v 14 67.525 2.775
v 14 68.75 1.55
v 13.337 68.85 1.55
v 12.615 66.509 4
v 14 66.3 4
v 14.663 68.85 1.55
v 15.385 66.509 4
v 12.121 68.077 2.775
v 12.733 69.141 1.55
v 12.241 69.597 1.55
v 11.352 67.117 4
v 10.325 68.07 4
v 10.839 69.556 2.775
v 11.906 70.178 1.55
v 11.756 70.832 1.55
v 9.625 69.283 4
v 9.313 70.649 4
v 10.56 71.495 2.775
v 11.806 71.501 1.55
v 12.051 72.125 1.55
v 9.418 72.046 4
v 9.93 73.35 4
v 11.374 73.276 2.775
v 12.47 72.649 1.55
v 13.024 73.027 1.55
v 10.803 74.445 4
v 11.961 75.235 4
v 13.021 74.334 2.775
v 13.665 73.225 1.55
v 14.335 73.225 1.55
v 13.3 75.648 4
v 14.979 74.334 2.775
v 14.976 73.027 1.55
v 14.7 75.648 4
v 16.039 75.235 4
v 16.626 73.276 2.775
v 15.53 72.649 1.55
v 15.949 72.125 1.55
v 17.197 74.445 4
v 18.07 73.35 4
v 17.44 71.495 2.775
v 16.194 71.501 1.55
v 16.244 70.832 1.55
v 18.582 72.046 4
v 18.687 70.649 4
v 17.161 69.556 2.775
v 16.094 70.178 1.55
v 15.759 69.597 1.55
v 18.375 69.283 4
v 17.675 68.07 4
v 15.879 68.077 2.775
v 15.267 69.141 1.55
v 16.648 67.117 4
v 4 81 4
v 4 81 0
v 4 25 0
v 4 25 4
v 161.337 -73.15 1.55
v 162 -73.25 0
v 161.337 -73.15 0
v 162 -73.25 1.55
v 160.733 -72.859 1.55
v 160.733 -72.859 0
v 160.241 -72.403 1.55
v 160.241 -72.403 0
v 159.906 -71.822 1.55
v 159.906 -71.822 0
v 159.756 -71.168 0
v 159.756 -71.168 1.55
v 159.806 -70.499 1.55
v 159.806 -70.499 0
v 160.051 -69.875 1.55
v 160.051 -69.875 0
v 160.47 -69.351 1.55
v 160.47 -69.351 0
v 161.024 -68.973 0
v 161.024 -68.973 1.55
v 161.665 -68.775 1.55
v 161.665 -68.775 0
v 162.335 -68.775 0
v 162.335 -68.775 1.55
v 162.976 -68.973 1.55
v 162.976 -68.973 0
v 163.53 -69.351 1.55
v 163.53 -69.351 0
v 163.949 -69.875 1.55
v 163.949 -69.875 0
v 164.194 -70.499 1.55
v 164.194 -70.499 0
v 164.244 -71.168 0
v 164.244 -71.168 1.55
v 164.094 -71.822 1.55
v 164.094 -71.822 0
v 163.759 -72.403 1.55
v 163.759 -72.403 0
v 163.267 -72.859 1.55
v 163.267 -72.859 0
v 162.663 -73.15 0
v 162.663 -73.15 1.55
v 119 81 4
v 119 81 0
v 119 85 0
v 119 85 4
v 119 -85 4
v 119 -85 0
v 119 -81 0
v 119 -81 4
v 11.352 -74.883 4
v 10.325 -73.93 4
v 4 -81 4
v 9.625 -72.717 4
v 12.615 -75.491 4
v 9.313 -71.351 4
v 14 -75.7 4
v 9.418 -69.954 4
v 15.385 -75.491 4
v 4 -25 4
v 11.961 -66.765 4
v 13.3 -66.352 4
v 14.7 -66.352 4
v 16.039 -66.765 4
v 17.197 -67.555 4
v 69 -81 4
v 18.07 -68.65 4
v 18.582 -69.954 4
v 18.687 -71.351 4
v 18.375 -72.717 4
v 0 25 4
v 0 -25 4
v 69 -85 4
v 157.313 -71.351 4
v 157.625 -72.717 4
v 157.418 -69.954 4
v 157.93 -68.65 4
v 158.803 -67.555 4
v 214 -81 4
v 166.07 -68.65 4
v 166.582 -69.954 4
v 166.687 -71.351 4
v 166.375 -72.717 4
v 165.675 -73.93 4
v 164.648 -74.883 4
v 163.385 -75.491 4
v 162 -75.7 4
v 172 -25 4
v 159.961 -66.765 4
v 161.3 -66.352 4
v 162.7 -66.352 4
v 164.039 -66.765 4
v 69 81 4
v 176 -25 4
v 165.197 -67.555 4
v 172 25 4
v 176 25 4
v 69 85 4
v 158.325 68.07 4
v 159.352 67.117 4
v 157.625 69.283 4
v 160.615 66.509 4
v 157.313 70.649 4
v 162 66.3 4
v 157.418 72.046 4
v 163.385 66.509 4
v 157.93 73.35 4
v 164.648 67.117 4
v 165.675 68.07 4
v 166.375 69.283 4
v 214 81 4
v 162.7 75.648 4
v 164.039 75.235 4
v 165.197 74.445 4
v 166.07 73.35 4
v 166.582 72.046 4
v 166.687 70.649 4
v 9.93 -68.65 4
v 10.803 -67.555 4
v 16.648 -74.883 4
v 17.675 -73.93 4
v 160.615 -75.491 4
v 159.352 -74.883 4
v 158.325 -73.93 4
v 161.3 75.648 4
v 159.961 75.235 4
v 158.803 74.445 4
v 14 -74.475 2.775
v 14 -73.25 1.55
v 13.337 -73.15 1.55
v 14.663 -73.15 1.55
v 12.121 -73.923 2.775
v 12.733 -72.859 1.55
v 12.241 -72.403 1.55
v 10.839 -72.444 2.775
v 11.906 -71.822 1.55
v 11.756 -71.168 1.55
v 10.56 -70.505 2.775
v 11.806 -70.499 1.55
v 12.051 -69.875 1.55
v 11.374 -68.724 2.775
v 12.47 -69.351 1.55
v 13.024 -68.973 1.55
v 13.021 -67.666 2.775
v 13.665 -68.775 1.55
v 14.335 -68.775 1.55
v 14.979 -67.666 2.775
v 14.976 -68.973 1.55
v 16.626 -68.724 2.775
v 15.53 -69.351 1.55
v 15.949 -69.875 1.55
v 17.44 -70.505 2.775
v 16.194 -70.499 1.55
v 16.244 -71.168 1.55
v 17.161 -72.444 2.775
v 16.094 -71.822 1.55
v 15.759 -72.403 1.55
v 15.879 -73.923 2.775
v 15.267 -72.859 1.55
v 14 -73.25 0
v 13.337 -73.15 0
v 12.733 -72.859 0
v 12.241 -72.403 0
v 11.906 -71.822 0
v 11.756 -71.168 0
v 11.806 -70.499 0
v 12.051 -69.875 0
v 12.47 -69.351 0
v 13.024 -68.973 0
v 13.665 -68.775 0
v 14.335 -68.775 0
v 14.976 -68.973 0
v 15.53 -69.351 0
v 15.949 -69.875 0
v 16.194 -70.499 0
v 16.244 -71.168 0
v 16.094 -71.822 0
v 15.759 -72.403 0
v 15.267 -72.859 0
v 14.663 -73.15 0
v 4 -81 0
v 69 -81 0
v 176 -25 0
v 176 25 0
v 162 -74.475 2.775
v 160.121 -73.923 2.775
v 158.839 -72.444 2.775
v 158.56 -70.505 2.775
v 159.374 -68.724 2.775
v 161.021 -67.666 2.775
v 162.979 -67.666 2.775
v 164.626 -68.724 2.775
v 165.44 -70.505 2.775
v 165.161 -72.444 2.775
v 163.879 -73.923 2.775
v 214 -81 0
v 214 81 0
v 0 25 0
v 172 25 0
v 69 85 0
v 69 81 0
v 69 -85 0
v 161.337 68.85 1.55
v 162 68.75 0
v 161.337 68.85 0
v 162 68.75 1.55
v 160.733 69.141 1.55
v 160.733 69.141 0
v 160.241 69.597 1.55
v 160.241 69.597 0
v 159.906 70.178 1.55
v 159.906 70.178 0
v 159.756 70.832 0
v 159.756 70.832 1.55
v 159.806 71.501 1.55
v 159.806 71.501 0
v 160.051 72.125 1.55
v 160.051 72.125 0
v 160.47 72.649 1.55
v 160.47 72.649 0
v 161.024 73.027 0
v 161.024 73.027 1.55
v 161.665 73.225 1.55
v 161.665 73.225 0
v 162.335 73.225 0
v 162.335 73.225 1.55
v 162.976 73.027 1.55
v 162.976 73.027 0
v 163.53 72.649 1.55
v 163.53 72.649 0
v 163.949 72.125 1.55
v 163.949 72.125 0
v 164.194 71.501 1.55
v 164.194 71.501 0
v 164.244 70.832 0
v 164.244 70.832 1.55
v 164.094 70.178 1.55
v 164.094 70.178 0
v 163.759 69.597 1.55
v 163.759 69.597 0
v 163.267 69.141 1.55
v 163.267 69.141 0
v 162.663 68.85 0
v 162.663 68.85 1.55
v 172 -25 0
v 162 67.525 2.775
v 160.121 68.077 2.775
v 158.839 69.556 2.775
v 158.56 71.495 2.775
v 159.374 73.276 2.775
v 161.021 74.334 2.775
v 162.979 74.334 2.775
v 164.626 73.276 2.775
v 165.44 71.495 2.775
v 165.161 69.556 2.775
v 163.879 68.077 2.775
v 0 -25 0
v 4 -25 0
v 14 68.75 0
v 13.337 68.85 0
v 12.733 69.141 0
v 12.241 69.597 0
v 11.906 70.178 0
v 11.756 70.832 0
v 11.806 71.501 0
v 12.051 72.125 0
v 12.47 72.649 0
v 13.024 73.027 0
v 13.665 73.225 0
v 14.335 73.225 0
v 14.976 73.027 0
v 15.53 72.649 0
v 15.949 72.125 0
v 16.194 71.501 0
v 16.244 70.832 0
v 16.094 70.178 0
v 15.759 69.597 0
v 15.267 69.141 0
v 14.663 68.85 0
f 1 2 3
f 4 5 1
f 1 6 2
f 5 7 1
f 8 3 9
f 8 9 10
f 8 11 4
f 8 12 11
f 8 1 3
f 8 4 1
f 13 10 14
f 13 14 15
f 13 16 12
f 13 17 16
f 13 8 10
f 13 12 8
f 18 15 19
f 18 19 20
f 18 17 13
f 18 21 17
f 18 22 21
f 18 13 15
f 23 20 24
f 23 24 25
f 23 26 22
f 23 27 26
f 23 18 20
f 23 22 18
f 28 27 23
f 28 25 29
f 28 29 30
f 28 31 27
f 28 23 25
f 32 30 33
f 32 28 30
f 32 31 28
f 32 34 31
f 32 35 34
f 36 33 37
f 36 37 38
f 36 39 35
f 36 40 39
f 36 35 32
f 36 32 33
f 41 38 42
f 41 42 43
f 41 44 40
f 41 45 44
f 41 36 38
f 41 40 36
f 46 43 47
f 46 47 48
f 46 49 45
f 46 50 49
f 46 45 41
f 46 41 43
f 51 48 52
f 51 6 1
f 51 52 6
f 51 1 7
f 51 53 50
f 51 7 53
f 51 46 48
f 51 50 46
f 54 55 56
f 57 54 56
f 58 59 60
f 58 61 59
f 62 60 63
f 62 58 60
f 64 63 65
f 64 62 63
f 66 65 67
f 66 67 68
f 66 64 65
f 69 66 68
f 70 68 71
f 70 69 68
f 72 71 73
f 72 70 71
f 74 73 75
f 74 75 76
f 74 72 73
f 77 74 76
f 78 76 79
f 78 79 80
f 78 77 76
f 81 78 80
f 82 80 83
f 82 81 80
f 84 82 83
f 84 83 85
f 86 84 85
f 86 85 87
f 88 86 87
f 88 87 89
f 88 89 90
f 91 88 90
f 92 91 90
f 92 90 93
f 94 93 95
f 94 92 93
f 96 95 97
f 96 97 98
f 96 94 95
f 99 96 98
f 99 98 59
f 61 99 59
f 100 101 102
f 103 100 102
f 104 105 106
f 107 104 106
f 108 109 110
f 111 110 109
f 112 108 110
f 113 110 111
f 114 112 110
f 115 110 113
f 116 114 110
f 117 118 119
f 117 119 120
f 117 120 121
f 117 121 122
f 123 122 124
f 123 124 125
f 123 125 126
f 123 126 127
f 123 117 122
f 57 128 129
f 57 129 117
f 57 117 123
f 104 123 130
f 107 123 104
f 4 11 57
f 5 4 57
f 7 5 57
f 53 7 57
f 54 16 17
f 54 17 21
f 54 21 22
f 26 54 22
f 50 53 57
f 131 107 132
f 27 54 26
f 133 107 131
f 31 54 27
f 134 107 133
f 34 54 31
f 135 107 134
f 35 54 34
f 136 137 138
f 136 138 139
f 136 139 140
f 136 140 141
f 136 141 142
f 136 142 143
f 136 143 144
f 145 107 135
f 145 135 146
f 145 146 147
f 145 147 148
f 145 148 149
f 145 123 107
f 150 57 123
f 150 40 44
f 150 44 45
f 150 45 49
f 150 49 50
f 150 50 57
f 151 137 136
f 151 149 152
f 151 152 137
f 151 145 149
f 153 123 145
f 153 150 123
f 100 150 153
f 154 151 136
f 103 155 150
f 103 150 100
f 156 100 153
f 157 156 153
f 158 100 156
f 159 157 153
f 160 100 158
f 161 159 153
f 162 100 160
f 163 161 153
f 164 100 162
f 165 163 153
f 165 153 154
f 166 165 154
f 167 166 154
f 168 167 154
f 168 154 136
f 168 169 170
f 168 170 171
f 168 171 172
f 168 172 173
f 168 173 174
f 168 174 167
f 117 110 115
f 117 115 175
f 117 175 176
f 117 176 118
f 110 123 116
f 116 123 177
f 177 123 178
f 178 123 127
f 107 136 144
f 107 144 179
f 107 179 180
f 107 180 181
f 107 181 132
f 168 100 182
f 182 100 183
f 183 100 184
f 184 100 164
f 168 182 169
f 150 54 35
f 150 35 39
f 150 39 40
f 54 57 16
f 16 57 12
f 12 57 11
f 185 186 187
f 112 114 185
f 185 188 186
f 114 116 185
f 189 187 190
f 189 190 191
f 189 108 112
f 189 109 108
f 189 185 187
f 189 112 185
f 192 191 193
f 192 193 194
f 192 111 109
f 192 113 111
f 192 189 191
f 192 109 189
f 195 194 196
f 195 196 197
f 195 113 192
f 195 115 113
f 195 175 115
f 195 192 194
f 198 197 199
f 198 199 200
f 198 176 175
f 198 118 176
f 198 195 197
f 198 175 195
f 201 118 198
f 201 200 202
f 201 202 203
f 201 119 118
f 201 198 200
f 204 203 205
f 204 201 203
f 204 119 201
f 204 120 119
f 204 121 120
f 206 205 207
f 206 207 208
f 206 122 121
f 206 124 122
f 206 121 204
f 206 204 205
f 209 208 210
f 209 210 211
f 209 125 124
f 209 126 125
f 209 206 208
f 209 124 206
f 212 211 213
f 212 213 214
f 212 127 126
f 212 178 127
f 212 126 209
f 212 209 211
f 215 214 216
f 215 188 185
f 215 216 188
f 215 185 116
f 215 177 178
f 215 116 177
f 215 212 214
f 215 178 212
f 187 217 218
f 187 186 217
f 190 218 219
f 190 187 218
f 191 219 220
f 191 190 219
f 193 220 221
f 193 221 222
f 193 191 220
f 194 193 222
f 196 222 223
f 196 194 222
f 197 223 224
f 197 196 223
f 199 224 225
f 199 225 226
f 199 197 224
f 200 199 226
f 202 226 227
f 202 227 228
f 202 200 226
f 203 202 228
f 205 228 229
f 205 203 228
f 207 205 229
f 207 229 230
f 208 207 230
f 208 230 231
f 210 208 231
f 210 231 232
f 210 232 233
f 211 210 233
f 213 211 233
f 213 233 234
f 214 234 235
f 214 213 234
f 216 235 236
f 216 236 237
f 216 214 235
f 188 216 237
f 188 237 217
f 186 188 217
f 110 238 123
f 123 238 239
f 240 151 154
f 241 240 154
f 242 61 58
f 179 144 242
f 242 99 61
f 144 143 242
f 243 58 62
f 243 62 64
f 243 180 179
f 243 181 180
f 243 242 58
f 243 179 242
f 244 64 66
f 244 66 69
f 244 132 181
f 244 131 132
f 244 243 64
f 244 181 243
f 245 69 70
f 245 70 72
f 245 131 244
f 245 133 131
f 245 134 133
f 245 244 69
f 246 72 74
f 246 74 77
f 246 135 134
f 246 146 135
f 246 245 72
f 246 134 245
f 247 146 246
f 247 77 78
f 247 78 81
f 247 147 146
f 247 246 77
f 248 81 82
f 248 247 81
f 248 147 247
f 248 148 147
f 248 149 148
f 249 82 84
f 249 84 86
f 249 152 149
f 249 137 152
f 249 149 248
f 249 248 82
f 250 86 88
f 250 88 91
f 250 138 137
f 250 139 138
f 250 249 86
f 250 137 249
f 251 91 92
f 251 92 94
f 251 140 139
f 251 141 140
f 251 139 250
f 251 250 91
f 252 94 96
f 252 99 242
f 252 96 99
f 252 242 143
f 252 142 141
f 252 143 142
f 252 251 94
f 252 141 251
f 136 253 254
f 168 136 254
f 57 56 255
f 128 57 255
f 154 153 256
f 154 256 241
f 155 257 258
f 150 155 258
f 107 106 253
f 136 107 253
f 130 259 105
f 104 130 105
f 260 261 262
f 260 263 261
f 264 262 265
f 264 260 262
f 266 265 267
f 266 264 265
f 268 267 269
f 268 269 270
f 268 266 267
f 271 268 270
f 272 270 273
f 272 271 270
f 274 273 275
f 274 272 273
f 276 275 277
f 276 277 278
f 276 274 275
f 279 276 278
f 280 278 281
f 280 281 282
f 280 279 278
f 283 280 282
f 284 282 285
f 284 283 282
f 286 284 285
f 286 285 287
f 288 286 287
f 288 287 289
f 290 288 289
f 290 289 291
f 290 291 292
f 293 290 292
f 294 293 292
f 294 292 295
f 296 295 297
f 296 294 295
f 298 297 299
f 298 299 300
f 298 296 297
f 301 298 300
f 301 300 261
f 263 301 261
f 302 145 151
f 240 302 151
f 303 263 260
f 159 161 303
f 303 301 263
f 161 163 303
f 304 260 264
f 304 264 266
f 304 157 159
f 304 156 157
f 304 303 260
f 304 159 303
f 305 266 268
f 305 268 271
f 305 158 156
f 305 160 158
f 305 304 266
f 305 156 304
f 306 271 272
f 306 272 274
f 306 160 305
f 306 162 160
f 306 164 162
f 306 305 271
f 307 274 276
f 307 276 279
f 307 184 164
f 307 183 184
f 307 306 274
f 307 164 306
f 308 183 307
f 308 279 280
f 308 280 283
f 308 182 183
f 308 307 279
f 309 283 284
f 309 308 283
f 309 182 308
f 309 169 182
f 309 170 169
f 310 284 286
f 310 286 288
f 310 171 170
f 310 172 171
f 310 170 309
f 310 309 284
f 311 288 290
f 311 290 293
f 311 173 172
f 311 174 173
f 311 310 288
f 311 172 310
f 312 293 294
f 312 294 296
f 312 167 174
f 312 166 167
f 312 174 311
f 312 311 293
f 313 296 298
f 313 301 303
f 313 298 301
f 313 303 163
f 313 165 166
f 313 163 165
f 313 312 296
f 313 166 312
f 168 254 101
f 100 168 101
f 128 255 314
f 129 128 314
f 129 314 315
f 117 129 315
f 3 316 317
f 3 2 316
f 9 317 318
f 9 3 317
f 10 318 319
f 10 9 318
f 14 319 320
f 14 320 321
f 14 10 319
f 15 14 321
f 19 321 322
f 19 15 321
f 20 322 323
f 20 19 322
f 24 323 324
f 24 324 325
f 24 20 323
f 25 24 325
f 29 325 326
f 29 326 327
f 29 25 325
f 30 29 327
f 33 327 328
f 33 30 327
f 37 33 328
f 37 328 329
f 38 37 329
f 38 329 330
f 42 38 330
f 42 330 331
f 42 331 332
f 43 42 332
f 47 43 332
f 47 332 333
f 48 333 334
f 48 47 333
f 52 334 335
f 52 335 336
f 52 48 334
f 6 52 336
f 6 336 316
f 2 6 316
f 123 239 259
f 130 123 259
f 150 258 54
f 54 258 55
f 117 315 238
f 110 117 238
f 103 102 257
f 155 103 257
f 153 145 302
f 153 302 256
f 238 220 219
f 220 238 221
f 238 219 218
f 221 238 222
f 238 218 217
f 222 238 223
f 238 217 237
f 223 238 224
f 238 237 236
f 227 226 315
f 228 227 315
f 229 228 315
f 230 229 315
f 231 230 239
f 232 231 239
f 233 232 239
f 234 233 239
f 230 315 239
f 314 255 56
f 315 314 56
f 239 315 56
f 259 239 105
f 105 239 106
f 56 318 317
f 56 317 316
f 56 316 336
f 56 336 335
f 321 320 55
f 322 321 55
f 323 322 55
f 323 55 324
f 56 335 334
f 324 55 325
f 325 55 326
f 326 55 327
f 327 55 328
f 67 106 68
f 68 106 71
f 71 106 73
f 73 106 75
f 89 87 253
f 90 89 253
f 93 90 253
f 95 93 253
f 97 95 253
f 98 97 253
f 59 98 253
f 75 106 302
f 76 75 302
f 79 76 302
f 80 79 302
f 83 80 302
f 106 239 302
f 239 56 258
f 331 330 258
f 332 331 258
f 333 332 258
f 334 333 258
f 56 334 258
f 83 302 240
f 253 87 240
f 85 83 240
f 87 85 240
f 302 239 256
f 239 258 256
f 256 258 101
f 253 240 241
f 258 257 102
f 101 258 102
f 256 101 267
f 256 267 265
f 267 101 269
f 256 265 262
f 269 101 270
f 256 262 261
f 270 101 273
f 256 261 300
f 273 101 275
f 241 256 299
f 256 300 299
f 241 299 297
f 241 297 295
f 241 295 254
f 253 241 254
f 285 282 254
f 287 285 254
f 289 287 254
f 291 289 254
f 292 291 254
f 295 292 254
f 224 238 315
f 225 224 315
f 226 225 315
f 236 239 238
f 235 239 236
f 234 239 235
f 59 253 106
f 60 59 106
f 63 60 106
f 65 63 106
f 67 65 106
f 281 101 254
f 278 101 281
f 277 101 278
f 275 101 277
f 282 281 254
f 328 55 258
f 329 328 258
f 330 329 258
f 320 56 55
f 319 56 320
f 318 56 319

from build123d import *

# Parameters (mm, degrees)
BOSS_EXTRUDE1_DEPTH                          = 4
CUT_EXTRUDE1_REACH                           = 232.298
SKETCH2_W                                    = 4
SKETCH2_H                                    = 50
CSK_FOR_M4_COUNTERSUNK_FLAT_HEAD_SCR_2_COUNT = 2
CSK_FOR_M4_COUNTERSUNK_FLAT_HEAD_SCR_2_PITCH = 148
CSK_FOR_M4_COUNTERSUNK_FLAT_HEAD_SCR_3_COUNT = 2
CSK_FOR_M4_COUNTERSUNK_FLAT_HEAD_SCR_3_PITCH = 205.104851235
CSK_FOR_M4_COUNTERSUNK_FLAT_HEAD_SCR_4_COUNT = 2
CSK_FOR_M4_COUNTERSUNK_FLAT_HEAD_SCR_4_PITCH = 142


with BuildPart() as part:
    # Sketch1 → Boss-Extrude1 (new body)
    with BuildSketch(Plane.XY):
        Polygon((0, 25), (0, 0), (214, 0), (214, 81), (119, 81), (119, 85), (69, 85), (69, 81), (4, 81), (4, 25), align=None)
        Polygon((0, 0), (0, -25), (4, -25), (4, -81), (69, -81), (69, -85), (119, -85), (119, -81), (214, -81), (214, 0), align=None)
    extrude(amount=BOSS_EXTRUDE1_DEPTH)

    # Sketch2 → Cut-Extrude1 (cut, up to next)
    with BuildSketch(Plane.XY.offset(4), mode=Mode.PRIVATE) as cut_extrude1_sk1:
        with Locations((174, 0)):
            Rectangle(SKETCH2_W, SKETCH2_H)
    cut_extrude1_tool1 = extrude(cut_extrude1_sk1.sketch, amount=-CUT_EXTRUDE1_REACH, mode=Mode.PRIVATE) & part.part
    add(cut_extrude1_tool1.solids().sort_by_distance((174, 0, 4))[0], mode=Mode.SUBTRACT)

    # Sketch4 → CSK for M4 Countersunk Flat Head Screw1 (revolve, cut)
    with BuildSketch(Plane(origin=(14, 71, 4), x_dir=(0, -1, 0), z_dir=(1, 0, 0))):
        Polygon((0, 0), (0, 4), (2.25, 4), (2.25, 2.45), (4.7, 0), align=None)
    csk_for_m4_countersunk_flat_head_screw1 = revolve(axis=Axis((14, 71, 10.35), (0, 0, -1)), mode=Mode.SUBTRACT)

    # CSK for M4 Countersunk Flat Head Scr 2: CSK for M4 Countersunk Flat Head Screw1 ×2
    with Locations(*[(i * CSK_FOR_M4_COUNTERSUNK_FLAT_HEAD_SCR_2_PITCH, 0, 0) for i in range(1, CSK_FOR_M4_COUNTERSUNK_FLAT_HEAD_SCR_2_COUNT)]):
        add(csk_for_m4_countersunk_flat_head_screw1, mode=Mode.SUBTRACT)

    # CSK for M4 Countersunk Flat Head Scr 3: CSK for M4 Countersunk Flat Head Screw1 ×2
    with Locations(*[Vector(0.7215821522946791, -0.6923288217962462, 0) * (i * CSK_FOR_M4_COUNTERSUNK_FLAT_HEAD_SCR_3_PITCH) for i in range(1, CSK_FOR_M4_COUNTERSUNK_FLAT_HEAD_SCR_3_COUNT)]):
        add(csk_for_m4_countersunk_flat_head_screw1, mode=Mode.SUBTRACT)

    # CSK for M4 Countersunk Flat Head Scr 4: CSK for M4 Countersunk Flat Head Screw1 ×2
    with Locations(*[(0, -i * CSK_FOR_M4_COUNTERSUNK_FLAT_HEAD_SCR_4_PITCH, 0) for i in range(1, CSK_FOR_M4_COUNTERSUNK_FLAT_HEAD_SCR_4_COUNT)]):
        add(csk_for_m4_countersunk_flat_head_screw1, mode=Mode.SUBTRACT)


solid = part.part
